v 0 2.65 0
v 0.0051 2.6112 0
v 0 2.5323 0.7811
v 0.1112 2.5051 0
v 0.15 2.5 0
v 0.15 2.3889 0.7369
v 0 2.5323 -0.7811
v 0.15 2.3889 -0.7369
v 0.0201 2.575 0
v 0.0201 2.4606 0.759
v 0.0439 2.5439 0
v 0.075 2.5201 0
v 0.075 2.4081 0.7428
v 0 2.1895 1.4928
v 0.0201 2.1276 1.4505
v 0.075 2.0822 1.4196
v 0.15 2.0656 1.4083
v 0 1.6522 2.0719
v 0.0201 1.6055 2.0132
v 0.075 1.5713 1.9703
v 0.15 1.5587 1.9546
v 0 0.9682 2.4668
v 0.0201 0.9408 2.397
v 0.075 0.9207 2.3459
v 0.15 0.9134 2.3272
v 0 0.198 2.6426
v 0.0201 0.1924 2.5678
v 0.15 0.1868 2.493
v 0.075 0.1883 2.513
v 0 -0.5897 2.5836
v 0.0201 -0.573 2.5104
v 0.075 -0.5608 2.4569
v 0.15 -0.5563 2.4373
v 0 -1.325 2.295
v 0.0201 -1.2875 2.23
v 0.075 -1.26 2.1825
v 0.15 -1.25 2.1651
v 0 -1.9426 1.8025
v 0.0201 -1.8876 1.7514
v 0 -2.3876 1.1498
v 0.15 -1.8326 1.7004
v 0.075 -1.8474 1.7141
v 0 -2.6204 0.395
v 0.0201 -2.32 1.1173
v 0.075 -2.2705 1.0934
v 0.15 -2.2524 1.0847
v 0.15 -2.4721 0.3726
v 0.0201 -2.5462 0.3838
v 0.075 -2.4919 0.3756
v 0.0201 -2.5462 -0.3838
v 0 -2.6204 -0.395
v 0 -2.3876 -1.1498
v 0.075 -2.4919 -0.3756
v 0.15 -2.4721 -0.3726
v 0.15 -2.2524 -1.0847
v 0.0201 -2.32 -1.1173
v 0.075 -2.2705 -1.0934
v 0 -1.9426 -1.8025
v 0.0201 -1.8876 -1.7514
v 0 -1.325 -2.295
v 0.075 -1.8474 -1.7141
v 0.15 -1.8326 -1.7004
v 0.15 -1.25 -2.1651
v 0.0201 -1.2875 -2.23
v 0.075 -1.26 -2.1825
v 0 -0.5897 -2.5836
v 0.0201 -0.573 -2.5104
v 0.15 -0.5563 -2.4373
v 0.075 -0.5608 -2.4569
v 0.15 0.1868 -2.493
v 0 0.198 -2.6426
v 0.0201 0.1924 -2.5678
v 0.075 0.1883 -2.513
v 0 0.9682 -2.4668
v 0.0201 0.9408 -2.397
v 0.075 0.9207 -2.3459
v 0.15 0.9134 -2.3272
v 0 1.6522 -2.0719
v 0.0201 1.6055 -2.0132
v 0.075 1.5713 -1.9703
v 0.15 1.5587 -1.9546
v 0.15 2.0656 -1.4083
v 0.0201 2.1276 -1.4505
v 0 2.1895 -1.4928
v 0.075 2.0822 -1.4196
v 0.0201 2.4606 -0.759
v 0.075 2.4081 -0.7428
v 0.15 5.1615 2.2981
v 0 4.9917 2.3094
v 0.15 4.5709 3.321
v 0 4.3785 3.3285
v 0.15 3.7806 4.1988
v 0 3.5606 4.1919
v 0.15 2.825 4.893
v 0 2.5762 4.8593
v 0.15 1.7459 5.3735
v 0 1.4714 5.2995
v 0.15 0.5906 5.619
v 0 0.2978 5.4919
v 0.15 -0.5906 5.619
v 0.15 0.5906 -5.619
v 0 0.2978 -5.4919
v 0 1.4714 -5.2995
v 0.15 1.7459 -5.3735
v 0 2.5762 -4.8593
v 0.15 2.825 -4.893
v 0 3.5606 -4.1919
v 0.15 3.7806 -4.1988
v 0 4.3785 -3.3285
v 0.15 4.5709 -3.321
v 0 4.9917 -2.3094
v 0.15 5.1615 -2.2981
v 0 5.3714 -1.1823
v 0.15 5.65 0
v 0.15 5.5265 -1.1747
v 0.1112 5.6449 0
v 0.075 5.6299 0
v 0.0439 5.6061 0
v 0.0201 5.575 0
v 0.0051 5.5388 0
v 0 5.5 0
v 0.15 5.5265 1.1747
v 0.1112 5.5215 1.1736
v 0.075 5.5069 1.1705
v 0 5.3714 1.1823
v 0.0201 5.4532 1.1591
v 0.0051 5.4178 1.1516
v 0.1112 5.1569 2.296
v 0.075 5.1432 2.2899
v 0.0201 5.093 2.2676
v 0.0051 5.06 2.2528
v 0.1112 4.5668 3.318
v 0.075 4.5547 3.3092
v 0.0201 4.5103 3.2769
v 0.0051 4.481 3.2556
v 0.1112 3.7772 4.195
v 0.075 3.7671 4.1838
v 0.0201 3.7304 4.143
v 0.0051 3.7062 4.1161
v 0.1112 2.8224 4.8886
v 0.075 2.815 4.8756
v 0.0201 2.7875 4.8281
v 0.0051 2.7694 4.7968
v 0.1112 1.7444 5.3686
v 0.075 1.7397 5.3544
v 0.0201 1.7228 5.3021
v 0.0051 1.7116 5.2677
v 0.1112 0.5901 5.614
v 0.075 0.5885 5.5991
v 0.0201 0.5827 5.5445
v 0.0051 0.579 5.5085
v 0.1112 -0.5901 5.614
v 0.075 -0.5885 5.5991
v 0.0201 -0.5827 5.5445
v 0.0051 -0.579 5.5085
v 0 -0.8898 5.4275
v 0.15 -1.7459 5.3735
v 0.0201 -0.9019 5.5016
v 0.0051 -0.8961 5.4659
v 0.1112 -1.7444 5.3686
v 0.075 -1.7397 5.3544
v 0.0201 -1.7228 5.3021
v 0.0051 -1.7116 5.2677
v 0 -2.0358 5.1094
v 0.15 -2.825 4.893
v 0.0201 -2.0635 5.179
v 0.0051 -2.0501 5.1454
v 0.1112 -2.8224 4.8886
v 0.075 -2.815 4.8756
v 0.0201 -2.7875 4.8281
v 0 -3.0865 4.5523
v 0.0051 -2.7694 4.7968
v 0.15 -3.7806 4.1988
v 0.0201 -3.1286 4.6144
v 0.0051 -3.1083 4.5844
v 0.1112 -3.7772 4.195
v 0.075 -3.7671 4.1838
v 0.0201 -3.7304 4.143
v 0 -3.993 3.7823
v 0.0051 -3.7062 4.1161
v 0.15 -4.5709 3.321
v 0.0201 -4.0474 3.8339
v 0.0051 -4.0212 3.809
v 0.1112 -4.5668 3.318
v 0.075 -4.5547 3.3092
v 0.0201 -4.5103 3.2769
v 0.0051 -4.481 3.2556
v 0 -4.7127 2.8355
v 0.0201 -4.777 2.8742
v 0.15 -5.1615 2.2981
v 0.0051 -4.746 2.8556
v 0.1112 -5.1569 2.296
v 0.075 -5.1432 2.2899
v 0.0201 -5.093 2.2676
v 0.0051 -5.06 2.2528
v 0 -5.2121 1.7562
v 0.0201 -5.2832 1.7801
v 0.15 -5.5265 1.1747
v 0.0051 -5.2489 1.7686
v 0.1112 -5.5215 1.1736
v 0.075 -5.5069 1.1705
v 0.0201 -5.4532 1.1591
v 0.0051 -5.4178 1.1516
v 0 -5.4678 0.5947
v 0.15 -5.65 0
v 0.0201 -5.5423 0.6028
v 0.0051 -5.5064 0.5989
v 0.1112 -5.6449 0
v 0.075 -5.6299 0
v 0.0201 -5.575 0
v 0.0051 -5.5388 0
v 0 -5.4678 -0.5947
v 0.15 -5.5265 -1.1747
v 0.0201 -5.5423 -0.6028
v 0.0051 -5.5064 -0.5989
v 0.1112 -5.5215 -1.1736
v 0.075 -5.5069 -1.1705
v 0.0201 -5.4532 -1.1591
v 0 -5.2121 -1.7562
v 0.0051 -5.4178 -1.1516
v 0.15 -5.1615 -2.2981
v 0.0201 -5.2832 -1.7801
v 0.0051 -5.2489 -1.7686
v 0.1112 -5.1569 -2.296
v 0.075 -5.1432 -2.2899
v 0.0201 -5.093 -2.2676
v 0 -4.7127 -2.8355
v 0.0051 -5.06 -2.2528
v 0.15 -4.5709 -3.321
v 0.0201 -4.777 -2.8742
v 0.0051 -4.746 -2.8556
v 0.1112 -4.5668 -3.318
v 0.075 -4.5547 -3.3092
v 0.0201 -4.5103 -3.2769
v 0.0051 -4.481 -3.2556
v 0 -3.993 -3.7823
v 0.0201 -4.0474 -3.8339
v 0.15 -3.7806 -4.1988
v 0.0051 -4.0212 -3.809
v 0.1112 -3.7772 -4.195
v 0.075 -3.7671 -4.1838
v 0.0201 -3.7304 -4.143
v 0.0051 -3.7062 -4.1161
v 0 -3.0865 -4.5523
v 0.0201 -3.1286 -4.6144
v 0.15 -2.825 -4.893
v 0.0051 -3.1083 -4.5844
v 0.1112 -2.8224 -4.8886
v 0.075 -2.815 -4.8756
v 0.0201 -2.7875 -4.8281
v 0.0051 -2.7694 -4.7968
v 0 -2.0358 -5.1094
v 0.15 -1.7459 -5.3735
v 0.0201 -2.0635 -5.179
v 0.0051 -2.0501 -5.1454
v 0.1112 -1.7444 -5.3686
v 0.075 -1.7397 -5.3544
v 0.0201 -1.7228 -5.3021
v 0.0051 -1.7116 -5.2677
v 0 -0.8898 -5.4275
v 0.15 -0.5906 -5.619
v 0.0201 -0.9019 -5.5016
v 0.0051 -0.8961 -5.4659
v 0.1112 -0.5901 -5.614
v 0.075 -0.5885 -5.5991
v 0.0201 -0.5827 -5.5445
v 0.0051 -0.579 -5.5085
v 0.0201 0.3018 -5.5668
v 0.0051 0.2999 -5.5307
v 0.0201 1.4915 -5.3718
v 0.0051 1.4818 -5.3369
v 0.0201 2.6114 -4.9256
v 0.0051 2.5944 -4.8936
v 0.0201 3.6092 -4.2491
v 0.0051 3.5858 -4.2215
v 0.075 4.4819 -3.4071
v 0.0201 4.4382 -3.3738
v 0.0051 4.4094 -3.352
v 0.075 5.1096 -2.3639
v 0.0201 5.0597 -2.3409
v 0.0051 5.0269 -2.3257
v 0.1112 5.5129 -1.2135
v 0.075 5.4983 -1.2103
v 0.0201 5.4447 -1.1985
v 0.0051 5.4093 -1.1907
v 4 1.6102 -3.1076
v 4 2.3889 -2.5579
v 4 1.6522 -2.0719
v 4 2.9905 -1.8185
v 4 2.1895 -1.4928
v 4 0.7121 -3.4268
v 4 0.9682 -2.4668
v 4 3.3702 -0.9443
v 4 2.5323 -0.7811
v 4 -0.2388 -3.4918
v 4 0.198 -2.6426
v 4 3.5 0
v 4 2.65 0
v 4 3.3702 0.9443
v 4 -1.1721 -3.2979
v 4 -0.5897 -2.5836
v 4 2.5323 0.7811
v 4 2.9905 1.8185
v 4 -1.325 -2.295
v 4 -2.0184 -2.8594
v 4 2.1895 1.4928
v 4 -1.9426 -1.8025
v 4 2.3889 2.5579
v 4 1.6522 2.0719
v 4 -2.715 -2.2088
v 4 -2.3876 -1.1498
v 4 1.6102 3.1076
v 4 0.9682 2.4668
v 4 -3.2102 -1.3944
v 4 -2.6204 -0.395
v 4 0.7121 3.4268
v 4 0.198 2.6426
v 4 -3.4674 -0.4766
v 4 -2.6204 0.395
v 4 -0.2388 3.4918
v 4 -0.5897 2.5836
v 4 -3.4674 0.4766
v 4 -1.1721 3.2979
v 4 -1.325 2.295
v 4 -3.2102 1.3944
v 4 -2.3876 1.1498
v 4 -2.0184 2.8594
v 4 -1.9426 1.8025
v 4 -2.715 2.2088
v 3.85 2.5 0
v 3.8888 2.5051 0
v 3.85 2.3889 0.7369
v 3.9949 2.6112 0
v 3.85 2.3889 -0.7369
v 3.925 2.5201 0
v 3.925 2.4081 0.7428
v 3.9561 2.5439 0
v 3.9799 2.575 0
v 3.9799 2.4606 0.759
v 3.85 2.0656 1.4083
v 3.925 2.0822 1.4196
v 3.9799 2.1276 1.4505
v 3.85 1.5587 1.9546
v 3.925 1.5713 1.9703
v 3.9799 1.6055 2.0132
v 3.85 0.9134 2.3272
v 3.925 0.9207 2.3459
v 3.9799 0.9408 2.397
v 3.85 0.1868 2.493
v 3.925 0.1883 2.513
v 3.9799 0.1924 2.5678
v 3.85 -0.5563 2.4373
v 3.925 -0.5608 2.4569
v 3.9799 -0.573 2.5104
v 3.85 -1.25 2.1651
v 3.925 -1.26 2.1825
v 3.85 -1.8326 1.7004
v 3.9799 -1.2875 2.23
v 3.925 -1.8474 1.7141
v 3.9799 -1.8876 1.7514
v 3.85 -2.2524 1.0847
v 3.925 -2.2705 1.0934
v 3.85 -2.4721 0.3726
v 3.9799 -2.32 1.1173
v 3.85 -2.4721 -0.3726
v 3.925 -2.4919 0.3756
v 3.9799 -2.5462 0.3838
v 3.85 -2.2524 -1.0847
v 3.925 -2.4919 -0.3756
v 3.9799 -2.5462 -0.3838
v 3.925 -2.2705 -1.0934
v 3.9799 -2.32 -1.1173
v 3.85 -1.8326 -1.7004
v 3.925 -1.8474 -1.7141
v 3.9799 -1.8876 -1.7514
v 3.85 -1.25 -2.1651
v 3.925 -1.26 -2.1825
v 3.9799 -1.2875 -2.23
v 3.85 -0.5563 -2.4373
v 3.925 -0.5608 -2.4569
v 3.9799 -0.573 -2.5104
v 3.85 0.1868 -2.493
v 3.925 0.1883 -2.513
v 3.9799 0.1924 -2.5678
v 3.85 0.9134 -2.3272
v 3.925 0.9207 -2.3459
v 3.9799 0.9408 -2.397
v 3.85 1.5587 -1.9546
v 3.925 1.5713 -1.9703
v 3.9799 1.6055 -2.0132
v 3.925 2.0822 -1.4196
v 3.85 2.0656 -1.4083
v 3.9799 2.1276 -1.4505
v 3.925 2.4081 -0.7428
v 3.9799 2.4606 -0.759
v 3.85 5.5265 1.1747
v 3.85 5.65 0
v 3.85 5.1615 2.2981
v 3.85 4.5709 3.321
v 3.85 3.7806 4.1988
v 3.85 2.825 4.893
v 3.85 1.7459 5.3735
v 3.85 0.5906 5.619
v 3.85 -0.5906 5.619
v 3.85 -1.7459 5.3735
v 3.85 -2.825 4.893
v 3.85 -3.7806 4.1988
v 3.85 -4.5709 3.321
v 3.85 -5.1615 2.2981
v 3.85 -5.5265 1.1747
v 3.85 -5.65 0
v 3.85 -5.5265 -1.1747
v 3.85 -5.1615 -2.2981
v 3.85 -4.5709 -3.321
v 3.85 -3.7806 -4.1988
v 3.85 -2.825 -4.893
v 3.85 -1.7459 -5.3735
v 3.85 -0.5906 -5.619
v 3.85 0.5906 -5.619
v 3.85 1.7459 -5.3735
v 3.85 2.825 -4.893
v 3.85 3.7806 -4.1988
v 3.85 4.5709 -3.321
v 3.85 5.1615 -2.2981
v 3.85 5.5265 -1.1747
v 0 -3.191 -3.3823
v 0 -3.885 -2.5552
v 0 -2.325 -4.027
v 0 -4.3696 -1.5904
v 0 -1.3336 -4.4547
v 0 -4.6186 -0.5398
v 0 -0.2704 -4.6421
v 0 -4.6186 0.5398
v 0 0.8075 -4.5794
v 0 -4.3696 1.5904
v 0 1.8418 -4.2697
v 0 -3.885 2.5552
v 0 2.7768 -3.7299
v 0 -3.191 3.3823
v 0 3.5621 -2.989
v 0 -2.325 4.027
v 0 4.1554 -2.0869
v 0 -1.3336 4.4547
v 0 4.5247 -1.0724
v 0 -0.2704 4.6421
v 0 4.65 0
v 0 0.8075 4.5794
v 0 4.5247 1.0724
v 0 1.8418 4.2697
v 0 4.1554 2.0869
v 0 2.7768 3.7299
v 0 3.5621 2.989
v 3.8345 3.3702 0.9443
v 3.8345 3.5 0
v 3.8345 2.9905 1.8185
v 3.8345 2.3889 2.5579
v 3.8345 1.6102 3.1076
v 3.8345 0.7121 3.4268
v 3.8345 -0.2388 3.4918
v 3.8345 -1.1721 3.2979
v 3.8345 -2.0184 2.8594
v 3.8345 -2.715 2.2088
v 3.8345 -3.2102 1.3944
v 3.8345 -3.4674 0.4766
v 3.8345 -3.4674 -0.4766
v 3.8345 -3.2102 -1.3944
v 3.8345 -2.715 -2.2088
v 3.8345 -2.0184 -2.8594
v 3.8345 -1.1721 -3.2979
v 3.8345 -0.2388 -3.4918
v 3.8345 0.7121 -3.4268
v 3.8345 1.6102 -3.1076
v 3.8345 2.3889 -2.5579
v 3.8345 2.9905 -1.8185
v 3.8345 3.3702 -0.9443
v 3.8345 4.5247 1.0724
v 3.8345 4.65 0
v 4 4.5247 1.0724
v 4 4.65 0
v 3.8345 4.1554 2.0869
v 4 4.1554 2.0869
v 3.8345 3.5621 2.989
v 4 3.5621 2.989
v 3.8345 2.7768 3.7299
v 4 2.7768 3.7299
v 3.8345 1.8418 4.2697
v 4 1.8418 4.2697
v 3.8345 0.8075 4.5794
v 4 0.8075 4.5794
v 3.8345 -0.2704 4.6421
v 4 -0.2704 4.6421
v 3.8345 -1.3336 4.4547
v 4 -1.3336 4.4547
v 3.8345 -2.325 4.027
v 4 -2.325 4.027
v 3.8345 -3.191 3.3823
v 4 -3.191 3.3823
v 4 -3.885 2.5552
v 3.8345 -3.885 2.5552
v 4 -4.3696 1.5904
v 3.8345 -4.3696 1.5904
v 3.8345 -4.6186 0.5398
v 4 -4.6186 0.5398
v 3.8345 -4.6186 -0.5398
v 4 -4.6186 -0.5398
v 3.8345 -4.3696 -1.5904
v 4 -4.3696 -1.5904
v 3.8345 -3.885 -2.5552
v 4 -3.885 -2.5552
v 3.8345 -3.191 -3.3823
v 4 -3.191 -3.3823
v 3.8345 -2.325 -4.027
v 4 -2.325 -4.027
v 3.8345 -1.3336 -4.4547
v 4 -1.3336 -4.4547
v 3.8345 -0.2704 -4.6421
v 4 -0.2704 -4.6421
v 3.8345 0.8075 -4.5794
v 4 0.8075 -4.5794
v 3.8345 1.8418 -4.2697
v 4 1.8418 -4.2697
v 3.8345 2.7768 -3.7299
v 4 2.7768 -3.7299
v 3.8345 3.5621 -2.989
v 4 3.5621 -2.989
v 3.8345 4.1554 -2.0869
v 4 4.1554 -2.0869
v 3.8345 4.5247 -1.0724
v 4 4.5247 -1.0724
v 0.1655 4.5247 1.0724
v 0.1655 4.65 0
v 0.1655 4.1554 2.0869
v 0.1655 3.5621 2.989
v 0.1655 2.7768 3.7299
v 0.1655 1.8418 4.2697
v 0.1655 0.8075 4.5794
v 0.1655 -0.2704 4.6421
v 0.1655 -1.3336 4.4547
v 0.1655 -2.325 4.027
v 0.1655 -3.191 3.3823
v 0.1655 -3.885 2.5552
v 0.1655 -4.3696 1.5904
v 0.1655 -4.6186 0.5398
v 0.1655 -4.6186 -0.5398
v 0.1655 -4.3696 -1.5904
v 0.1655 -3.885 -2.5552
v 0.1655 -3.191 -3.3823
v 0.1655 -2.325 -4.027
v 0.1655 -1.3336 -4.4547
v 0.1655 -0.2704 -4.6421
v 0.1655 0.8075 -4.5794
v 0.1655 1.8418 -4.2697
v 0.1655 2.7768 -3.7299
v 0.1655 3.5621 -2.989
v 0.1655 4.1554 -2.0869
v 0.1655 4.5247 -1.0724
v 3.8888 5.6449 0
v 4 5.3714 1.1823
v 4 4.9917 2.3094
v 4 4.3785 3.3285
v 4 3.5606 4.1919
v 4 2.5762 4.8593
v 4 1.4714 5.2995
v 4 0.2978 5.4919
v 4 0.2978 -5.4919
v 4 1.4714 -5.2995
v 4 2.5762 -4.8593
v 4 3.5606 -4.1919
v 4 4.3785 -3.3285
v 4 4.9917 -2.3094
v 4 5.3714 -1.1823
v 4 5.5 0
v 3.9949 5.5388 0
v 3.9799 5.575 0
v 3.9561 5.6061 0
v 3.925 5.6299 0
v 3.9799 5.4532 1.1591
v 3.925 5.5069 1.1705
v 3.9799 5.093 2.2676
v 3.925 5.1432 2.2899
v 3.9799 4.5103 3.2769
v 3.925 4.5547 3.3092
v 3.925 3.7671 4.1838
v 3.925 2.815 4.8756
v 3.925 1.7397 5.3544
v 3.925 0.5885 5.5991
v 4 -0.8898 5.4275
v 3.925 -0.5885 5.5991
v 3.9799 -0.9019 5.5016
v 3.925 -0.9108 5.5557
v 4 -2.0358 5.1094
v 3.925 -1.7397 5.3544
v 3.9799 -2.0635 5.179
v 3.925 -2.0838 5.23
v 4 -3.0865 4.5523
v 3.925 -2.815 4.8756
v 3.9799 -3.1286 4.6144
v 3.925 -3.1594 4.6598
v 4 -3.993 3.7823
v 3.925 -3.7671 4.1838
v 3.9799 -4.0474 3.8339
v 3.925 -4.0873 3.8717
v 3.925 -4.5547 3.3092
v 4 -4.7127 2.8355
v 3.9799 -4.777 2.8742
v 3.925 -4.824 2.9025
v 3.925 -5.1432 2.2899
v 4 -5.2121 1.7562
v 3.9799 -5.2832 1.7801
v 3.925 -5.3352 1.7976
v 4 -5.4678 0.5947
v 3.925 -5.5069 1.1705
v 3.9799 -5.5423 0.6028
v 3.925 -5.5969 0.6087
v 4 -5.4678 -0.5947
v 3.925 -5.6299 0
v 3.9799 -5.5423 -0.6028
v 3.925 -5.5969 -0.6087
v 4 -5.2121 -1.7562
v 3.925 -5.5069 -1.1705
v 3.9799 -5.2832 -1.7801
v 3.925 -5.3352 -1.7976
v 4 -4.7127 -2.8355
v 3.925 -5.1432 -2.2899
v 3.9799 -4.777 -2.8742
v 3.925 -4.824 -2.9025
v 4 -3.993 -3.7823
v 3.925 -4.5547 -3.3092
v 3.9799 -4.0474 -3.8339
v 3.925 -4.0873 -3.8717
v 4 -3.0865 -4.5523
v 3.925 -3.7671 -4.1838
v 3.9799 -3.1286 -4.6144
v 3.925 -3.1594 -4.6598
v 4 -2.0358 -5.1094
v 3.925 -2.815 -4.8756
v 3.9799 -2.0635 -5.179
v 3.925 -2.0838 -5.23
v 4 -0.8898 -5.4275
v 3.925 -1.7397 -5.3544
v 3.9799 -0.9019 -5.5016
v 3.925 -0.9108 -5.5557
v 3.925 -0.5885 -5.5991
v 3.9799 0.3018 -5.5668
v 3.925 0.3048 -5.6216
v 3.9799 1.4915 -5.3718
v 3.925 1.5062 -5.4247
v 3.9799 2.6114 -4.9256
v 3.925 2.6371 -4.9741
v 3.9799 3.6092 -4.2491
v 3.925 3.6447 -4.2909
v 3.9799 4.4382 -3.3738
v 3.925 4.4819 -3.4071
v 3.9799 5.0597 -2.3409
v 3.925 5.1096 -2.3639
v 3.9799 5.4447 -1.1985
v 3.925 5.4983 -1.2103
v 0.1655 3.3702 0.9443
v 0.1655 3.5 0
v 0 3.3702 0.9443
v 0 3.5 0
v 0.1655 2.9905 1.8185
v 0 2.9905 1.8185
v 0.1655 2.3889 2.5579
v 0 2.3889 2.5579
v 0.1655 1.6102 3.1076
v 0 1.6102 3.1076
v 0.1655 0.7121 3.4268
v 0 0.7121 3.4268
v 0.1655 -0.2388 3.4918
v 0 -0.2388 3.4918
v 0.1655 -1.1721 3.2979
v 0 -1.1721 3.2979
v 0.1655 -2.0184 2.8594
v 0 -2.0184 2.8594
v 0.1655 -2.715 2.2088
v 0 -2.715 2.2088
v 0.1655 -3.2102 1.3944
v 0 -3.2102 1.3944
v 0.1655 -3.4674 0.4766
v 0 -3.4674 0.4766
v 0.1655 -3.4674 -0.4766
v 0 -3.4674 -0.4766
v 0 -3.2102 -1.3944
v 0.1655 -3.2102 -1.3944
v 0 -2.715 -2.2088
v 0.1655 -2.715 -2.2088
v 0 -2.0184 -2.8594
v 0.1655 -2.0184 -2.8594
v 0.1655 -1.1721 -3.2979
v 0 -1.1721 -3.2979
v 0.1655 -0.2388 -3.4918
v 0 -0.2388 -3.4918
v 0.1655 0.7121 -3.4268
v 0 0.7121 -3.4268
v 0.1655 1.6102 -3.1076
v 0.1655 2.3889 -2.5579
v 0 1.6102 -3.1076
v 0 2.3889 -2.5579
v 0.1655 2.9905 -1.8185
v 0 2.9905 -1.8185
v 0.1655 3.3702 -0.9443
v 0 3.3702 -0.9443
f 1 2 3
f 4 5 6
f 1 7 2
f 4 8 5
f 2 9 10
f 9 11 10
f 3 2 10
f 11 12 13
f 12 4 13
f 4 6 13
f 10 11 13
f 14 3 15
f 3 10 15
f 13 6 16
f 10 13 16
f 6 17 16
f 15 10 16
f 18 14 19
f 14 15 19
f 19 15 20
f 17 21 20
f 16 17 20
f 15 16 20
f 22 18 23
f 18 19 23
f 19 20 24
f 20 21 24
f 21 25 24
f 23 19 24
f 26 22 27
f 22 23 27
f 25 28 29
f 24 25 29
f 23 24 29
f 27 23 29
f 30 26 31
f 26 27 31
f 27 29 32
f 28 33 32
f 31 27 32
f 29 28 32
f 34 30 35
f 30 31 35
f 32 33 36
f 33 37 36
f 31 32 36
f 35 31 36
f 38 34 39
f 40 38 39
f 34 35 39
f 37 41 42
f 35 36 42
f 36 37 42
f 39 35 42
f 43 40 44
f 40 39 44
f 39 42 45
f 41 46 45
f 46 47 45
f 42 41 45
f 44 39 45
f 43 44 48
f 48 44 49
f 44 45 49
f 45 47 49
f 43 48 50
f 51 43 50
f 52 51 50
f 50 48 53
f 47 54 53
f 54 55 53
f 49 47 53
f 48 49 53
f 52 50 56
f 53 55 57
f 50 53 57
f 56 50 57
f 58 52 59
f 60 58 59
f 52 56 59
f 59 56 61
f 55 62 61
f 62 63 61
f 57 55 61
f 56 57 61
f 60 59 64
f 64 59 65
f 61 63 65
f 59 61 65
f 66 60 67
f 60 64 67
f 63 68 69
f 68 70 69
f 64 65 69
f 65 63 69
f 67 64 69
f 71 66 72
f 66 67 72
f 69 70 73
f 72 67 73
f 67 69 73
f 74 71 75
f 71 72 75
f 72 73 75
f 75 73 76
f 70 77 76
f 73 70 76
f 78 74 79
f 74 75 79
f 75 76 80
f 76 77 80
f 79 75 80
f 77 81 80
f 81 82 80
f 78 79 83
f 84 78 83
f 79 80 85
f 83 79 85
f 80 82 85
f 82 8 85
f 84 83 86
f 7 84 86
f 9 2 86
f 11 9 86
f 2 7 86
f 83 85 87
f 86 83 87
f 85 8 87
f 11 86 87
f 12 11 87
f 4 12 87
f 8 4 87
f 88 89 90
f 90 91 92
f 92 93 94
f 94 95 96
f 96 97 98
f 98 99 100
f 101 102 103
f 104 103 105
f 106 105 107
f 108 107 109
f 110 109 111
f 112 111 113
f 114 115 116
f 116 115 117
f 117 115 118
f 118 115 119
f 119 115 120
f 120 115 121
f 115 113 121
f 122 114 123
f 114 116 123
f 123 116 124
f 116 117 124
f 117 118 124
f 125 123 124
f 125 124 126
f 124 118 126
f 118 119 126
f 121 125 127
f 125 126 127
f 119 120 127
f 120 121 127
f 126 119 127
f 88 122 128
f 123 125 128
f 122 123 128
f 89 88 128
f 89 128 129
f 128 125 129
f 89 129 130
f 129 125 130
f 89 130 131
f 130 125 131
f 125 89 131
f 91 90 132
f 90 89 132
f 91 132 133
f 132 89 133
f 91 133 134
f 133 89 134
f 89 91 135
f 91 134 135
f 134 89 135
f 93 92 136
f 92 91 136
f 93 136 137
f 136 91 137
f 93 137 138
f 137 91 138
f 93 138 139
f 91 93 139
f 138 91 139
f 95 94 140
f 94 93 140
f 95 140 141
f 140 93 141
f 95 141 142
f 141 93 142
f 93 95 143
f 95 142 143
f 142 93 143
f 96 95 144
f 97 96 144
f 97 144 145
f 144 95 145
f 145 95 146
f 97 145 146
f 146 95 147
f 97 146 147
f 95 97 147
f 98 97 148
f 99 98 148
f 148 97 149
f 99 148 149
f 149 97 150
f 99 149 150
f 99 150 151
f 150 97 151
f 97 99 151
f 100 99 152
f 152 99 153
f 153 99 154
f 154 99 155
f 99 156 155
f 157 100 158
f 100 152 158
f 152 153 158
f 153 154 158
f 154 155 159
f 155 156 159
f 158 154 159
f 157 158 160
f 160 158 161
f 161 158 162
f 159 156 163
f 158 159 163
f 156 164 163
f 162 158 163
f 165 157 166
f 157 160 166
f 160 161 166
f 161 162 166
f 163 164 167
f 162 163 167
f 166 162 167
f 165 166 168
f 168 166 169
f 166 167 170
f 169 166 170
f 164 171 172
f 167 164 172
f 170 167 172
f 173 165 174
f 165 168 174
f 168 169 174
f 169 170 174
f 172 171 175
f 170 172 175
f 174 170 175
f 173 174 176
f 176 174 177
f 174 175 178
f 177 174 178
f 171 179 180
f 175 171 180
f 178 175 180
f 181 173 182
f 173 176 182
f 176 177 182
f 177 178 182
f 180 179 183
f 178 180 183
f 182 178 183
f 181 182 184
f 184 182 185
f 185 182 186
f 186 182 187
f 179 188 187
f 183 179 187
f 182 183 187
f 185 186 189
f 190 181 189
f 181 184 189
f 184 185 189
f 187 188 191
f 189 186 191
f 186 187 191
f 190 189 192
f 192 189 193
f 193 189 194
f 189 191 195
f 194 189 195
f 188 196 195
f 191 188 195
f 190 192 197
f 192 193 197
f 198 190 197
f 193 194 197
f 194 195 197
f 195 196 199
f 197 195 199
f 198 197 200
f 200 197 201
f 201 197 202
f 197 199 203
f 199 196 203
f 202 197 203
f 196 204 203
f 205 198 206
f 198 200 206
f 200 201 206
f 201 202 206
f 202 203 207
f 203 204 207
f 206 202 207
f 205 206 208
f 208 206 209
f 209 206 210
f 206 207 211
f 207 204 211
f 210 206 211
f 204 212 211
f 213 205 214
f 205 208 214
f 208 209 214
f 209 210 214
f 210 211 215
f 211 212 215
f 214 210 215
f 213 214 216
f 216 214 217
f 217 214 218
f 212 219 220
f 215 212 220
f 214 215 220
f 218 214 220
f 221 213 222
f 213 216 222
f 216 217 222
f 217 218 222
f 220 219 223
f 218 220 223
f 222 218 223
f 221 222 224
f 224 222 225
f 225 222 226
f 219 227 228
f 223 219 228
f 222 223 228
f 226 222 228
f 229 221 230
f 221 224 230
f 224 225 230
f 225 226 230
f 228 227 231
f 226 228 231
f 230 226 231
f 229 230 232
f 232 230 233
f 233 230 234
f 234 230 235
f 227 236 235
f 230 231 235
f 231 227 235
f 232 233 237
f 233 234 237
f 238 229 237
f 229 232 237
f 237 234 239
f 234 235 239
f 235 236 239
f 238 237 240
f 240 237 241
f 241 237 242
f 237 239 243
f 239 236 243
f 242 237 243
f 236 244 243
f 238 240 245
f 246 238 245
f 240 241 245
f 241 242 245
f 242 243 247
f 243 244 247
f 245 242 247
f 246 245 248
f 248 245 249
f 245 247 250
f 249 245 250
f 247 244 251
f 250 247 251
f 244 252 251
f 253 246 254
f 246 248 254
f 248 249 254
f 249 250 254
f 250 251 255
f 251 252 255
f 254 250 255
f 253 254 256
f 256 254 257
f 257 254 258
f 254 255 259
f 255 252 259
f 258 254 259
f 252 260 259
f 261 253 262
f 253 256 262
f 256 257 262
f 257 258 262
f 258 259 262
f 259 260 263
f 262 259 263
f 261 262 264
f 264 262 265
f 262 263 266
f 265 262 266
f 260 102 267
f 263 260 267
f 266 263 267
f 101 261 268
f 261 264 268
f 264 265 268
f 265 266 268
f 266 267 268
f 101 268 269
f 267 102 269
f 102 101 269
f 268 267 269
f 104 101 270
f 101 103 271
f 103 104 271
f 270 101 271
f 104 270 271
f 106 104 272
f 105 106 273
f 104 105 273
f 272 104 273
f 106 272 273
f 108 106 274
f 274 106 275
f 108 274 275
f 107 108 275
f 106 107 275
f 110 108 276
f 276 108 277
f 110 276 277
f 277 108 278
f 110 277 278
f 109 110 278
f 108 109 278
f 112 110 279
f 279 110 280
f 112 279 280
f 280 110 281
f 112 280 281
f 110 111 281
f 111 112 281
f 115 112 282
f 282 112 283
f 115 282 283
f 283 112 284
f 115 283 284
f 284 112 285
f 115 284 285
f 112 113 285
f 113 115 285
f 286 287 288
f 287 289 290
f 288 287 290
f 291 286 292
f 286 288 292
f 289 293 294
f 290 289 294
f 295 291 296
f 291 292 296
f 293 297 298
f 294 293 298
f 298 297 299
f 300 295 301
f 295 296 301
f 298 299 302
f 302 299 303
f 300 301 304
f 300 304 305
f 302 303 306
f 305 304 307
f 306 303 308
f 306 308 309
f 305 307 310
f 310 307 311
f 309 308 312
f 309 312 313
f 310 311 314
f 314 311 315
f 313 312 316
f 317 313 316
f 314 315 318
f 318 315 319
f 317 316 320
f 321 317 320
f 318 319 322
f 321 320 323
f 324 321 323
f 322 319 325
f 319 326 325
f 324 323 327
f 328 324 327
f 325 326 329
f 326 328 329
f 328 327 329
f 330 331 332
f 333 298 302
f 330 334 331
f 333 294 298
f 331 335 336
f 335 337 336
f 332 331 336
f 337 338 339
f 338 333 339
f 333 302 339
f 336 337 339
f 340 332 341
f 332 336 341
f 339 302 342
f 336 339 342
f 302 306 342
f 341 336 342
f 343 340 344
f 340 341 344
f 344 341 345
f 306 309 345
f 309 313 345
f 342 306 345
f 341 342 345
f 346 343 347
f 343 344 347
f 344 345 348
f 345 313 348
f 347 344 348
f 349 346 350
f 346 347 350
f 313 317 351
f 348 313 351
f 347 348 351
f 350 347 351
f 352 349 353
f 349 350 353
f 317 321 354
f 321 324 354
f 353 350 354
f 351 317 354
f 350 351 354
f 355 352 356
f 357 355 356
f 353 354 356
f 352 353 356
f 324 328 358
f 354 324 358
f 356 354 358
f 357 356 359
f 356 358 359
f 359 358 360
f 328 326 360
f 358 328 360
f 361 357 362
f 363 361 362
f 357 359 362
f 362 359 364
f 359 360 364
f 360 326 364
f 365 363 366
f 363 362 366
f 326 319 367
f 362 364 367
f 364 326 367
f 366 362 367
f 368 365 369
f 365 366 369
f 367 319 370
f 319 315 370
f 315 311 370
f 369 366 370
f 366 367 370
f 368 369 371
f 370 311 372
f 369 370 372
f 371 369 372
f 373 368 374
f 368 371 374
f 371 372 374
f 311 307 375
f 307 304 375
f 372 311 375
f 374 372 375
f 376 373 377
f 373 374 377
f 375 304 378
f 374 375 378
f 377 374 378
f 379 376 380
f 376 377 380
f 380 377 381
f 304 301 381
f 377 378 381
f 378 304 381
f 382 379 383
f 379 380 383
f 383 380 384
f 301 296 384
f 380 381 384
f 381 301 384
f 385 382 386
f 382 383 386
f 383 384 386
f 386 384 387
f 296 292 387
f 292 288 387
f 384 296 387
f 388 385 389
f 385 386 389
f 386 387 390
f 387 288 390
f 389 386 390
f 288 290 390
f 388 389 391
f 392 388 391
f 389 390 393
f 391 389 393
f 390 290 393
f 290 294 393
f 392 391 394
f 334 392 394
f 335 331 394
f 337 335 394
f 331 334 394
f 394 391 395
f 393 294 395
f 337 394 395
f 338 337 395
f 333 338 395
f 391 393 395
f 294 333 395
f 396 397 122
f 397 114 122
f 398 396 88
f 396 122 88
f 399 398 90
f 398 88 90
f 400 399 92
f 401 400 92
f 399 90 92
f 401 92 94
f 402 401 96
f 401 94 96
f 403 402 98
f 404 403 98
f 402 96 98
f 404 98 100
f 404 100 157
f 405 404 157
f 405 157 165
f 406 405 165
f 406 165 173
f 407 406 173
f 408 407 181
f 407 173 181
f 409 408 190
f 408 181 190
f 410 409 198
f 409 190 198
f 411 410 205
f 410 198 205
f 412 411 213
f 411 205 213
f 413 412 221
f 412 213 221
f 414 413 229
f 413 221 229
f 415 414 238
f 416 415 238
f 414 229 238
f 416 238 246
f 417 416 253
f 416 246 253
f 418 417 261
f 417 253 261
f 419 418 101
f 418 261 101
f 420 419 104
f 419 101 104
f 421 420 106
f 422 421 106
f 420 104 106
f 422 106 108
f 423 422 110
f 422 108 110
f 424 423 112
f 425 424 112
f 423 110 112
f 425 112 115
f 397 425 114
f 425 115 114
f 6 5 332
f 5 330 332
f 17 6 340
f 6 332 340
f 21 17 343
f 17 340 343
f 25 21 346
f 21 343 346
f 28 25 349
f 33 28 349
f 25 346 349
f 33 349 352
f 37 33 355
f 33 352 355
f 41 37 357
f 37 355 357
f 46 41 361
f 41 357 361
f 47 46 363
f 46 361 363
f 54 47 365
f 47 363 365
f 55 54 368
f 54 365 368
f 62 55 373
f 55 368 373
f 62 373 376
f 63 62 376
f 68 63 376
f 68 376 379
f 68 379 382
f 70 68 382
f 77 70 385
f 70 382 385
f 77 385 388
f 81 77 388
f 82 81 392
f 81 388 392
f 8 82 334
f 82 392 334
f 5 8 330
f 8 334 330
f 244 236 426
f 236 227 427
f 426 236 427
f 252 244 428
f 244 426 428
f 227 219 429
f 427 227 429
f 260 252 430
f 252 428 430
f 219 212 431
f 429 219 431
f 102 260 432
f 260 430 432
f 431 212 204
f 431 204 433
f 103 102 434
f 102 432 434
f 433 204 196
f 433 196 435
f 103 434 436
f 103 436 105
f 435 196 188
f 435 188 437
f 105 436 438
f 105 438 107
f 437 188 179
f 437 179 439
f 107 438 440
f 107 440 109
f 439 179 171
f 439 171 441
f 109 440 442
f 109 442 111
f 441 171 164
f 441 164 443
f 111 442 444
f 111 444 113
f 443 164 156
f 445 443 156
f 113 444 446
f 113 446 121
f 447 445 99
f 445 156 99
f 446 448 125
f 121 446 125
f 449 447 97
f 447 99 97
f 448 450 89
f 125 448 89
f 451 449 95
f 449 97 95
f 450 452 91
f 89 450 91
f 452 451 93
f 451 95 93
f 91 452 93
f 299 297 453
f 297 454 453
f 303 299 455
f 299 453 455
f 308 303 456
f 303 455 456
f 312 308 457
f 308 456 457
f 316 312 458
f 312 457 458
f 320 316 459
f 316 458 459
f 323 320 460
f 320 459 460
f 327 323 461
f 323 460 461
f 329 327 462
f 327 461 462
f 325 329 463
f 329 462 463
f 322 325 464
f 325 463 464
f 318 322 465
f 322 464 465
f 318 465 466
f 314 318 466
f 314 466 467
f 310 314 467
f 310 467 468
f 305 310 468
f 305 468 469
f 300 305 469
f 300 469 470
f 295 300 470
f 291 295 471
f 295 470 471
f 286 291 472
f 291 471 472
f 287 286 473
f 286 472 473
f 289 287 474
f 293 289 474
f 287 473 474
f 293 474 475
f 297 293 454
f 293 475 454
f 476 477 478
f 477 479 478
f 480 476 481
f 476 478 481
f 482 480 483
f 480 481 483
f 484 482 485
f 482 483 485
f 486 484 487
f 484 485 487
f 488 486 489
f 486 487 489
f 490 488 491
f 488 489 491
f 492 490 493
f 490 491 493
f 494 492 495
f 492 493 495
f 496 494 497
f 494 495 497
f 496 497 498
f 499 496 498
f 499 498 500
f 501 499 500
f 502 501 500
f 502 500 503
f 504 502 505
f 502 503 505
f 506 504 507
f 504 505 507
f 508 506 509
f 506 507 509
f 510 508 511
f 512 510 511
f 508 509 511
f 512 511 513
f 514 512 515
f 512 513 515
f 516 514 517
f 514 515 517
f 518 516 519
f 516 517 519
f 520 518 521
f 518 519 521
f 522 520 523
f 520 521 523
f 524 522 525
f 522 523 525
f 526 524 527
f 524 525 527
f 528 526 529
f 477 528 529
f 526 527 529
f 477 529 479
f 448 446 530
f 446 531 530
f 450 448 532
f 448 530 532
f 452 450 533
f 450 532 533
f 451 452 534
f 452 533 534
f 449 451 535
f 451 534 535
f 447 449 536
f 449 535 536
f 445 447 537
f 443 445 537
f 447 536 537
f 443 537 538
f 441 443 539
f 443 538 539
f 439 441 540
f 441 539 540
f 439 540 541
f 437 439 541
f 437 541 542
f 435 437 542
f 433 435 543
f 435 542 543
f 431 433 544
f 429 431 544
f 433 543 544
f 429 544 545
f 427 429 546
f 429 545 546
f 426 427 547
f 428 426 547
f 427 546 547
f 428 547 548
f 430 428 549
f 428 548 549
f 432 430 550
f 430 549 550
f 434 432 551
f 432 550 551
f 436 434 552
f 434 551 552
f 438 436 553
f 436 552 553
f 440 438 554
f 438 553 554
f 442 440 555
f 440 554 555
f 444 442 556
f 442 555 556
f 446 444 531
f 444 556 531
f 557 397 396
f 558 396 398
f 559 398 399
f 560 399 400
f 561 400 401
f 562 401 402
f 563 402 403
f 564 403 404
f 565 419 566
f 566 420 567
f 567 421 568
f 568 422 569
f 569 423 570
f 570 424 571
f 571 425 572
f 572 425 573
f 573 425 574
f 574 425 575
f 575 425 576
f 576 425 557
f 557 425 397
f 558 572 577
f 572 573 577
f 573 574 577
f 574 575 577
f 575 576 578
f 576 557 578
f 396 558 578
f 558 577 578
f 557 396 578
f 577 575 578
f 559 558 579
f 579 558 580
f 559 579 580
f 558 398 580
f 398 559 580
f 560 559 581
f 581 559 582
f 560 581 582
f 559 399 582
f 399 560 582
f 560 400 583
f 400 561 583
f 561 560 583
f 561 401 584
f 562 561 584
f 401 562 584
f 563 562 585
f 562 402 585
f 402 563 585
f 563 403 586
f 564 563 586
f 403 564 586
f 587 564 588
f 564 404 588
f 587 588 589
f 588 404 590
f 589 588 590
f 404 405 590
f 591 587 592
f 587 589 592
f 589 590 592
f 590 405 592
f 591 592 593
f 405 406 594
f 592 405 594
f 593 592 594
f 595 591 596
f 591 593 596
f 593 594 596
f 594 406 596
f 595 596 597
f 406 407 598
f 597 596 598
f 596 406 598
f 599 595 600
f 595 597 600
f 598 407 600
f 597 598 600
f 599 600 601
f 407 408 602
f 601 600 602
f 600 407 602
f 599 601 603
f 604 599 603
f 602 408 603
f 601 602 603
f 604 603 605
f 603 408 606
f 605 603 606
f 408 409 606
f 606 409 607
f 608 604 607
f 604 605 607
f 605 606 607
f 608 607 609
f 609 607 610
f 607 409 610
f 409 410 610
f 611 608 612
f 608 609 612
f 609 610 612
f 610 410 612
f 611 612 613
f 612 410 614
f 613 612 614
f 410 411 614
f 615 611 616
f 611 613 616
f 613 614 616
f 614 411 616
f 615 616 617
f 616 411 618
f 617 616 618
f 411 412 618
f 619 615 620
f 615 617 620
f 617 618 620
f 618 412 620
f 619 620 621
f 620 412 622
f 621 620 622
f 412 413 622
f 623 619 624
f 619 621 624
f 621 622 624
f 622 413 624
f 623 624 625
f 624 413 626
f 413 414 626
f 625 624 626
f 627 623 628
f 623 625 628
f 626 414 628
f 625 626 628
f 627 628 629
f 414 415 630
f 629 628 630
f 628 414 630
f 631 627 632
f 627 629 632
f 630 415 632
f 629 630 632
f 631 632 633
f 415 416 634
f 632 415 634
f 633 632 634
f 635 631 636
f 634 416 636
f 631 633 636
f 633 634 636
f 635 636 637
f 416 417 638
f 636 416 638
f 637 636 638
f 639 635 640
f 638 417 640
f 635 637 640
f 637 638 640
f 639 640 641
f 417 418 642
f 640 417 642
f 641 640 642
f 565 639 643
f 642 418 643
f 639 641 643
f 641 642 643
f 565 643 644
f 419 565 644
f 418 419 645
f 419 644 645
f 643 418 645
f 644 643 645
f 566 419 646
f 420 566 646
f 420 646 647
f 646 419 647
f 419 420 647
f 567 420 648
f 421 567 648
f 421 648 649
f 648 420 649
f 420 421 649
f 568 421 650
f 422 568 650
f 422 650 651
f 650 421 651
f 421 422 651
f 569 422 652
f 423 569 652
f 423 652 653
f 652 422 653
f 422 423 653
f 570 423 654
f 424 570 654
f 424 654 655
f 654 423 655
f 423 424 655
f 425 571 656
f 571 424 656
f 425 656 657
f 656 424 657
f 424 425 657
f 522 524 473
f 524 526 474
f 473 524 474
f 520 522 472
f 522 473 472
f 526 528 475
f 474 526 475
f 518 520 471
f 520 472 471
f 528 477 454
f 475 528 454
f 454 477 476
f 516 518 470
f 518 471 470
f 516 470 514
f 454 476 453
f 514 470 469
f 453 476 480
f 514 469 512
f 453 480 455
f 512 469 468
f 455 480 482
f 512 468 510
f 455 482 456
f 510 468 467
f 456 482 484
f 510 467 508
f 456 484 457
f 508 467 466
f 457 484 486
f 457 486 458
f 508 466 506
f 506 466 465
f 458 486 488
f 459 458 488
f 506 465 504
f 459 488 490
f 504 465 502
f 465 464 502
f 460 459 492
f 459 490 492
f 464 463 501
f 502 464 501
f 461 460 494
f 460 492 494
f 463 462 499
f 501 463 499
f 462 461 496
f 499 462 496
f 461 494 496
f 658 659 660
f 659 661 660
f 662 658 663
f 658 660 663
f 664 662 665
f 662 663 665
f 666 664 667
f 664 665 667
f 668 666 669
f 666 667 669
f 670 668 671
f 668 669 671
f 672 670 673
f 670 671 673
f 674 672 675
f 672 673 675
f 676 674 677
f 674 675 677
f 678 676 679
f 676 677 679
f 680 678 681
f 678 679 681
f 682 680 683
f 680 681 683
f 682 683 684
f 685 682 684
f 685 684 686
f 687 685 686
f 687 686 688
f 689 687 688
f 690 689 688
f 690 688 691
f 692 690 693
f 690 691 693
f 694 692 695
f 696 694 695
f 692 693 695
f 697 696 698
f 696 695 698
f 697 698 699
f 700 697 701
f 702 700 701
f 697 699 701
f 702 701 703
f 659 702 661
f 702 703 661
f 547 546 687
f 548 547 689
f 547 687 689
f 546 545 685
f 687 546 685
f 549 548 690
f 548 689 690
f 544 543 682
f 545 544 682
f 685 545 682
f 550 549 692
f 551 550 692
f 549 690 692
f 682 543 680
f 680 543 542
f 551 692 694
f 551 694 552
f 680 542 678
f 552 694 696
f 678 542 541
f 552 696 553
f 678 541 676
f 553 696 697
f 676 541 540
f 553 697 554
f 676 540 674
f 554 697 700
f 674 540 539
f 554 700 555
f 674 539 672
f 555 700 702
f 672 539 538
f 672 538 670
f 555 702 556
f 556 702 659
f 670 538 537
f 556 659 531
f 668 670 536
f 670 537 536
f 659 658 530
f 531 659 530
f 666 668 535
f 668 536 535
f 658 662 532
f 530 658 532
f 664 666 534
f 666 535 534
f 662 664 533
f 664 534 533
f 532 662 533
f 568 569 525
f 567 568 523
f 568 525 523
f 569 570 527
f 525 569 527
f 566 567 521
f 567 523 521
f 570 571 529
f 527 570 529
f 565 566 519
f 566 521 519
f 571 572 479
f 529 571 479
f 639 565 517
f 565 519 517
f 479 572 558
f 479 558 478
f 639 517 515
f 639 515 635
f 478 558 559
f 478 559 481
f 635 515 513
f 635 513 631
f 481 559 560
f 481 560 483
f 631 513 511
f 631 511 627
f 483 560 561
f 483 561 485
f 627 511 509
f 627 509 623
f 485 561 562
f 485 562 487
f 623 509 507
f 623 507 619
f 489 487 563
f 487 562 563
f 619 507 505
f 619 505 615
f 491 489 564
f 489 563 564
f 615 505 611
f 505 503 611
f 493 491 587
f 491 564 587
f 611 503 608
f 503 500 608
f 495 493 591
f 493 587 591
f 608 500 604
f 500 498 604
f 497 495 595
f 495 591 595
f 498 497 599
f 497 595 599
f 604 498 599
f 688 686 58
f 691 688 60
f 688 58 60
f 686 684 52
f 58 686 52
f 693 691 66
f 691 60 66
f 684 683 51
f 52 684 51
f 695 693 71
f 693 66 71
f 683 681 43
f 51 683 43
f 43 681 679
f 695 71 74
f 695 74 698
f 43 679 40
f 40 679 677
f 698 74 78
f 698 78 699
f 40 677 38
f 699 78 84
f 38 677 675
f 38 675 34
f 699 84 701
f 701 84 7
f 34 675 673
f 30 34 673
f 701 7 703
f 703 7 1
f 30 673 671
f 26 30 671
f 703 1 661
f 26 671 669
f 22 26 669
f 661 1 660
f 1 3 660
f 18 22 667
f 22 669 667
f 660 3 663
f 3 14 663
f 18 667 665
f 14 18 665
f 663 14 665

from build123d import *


with BuildPart() as part:
    # Sketch1 → Revolve1 (revolve)
    with BuildSketch(Plane.XY):
        with BuildLine():
            Line((0, 3.5), (0, 2.65))
            ThreePointArc((0, 2.65), (0.043933983, 2.543933983), (0.15, 2.5))
            Line((0.15, 2.5), (3.85, 2.5))
            ThreePointArc((3.85, 2.5), (3.956066017, 2.543933983), (4, 2.65))
            Line((4, 2.65), (4, 3.5))
            Line((4, 3.5), (3.8345, 3.5))
            Line((3.8345, 3.5), (3.8345, 4.65))
            Line((3.8345, 4.65), (4, 4.65))
            Line((4, 4.65), (4, 5.5))
            ThreePointArc((4, 5.5), (3.956066017, 5.606066017), (3.85, 5.65))
            Line((3.85, 5.65), (0.15, 5.65))
            ThreePointArc((0.15, 5.65), (0.043933983, 5.606066017), (0, 5.5))
            Line((0, 5.5), (0, 4.65))
            Line((0, 4.65), (0.1655, 4.65))
            Line((0.1655, 4.65), (0.1655, 3.5))
            Line((0.1655, 3.5), (0, 3.5))
        make_face()
    revolve(axis=Axis((-0.0025, 0, 0), (1, 0, 0)))


solid = part.part
